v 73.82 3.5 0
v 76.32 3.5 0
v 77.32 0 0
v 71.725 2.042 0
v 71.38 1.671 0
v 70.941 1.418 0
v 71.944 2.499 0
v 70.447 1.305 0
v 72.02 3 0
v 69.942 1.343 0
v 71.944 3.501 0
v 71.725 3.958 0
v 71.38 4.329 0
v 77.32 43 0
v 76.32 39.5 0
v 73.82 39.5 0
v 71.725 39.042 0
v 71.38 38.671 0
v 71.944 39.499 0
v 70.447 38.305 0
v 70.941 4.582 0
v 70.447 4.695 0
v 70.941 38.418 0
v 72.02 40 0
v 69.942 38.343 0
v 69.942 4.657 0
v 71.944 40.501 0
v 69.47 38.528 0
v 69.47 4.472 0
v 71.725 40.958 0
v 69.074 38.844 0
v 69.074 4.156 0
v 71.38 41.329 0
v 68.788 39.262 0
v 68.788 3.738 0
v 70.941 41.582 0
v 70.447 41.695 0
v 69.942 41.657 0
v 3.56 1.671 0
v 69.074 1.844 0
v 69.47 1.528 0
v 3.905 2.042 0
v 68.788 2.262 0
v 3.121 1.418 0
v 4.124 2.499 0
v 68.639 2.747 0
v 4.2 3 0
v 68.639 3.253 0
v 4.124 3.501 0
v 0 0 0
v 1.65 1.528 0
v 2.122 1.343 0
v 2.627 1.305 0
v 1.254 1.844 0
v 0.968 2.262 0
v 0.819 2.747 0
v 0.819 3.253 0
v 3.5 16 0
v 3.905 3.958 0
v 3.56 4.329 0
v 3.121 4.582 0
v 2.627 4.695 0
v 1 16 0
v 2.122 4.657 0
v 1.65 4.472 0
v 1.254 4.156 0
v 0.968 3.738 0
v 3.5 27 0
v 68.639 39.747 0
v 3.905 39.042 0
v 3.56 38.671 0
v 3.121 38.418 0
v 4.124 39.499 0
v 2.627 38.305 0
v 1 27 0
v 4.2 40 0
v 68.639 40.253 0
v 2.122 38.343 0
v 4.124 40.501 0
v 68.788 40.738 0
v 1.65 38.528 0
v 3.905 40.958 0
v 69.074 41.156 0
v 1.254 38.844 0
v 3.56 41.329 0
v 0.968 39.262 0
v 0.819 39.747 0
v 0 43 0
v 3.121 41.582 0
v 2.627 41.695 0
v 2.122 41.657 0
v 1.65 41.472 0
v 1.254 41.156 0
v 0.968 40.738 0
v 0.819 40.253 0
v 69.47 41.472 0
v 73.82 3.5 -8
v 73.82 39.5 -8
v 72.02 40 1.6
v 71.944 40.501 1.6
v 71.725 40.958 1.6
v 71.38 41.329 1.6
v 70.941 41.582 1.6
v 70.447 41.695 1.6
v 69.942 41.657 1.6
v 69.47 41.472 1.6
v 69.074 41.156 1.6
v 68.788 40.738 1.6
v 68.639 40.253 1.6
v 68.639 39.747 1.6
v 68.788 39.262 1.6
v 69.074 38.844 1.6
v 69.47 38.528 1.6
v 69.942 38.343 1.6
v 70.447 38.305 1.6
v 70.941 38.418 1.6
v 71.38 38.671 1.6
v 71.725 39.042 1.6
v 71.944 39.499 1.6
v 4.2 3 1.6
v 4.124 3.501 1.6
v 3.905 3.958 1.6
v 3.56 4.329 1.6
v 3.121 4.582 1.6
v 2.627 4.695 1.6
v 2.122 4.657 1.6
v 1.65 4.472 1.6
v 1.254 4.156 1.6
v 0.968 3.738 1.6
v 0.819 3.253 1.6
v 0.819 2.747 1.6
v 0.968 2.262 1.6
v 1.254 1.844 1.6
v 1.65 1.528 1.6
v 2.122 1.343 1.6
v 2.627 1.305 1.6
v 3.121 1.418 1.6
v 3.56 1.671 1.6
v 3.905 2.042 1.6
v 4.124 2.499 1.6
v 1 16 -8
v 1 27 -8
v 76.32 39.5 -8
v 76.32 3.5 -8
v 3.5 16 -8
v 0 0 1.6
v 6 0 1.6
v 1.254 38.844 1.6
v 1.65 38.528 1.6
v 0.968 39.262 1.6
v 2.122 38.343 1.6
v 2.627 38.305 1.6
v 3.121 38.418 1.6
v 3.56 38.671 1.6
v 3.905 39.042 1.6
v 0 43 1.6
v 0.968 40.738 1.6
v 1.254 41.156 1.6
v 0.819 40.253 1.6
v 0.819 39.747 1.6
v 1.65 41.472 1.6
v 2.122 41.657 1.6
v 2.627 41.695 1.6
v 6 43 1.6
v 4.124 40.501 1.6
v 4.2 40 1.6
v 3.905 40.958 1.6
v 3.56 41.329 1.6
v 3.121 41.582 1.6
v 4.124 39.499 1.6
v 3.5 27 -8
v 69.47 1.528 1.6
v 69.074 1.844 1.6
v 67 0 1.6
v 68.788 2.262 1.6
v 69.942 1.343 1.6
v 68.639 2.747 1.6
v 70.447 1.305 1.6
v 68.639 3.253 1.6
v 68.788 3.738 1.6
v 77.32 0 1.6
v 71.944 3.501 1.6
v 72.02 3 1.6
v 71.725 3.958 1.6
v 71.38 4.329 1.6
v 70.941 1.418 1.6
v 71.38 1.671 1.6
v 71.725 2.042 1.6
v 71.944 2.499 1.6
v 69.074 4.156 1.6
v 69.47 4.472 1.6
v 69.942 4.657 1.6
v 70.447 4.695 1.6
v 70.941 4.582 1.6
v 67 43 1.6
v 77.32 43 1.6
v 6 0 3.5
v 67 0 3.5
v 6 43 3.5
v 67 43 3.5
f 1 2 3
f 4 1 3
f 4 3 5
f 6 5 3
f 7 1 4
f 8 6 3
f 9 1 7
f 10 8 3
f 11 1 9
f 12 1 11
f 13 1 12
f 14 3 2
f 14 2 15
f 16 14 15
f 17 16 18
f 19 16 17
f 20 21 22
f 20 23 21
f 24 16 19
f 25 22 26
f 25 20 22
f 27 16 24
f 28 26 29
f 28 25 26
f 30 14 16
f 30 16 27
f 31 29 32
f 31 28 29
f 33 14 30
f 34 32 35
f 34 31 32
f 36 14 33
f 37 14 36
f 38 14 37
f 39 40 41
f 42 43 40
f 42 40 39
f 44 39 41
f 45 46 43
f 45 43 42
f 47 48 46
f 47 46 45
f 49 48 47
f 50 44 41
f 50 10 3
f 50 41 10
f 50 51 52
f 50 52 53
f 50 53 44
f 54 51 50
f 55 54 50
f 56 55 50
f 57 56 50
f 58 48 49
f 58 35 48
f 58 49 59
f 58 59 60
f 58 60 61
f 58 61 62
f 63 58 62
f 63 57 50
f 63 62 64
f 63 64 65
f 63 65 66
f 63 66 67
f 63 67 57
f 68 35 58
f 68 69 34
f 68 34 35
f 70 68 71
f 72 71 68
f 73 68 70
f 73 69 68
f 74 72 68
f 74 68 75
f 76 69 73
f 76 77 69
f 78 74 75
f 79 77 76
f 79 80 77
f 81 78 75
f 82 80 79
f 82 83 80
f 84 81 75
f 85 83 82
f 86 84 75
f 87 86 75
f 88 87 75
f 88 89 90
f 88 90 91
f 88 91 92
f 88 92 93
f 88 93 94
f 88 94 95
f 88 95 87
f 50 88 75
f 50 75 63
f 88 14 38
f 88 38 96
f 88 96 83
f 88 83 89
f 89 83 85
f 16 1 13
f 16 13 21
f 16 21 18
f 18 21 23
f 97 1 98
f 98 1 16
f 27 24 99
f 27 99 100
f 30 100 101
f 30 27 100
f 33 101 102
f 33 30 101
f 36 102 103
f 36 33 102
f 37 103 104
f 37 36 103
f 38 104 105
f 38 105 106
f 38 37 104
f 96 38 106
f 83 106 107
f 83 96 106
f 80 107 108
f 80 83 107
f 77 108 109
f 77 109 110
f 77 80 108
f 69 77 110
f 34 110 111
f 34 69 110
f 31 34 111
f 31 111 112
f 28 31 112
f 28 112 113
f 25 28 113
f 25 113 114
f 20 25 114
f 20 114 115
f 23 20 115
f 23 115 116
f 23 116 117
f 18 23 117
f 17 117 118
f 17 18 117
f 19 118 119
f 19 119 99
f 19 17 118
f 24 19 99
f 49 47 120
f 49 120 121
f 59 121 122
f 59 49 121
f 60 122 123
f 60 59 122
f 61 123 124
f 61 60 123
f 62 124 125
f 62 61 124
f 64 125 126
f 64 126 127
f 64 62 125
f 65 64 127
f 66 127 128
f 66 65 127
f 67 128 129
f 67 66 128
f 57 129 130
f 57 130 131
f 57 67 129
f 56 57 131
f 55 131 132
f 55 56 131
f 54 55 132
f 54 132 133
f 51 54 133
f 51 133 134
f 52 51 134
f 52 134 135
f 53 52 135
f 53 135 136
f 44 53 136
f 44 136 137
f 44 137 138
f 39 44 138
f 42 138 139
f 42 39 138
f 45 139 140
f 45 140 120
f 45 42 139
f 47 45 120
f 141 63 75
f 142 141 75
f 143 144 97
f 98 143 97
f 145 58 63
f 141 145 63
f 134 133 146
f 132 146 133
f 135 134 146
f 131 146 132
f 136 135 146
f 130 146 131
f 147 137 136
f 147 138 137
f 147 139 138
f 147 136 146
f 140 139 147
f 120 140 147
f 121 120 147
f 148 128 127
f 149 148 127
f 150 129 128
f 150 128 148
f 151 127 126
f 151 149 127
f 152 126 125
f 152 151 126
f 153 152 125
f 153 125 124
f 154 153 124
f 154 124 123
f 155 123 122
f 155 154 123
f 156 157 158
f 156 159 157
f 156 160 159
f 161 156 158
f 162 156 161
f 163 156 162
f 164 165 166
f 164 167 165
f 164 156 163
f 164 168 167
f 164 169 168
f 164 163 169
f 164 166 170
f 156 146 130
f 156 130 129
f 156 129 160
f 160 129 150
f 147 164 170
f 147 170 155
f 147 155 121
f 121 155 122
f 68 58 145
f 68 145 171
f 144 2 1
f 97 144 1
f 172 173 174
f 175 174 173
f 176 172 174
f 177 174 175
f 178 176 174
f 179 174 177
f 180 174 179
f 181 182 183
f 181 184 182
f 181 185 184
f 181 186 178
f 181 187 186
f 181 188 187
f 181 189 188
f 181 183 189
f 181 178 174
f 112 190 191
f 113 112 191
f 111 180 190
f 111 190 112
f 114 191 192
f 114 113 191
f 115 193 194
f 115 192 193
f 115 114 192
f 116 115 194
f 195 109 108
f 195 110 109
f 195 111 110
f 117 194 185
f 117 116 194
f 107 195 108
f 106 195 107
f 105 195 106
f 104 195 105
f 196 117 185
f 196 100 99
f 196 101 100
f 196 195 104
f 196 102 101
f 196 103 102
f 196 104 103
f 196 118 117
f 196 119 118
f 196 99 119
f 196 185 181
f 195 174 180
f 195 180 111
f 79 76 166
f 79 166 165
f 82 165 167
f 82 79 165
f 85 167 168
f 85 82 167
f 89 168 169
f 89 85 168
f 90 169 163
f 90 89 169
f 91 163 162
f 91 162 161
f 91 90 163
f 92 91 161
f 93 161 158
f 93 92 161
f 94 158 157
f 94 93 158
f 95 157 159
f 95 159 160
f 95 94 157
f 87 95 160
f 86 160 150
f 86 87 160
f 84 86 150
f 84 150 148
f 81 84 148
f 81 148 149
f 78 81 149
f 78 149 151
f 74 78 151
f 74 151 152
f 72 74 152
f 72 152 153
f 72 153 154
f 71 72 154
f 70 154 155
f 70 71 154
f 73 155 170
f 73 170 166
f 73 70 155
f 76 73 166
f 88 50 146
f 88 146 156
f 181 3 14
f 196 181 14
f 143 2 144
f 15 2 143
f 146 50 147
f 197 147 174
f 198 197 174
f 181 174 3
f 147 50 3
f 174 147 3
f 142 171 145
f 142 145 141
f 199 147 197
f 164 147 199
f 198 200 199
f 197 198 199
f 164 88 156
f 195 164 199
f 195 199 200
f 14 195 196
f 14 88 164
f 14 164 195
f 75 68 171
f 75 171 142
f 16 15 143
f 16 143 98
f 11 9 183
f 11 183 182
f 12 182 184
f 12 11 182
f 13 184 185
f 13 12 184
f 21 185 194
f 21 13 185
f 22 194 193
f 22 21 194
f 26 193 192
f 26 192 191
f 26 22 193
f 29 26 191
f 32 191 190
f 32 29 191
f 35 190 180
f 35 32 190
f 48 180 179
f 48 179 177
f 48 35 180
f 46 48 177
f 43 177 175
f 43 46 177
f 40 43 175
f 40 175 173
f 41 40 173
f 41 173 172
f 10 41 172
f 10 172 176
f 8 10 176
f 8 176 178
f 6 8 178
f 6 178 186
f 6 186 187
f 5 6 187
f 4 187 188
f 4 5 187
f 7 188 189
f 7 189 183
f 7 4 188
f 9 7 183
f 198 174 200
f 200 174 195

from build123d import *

# Parameters (mm, degrees)
SKETCH1_W           = 77.32
SKETCH1_H           = 43
SKETCH1_R           = 1.7
BOSS_EXTRUDE1_DEPTH = 1.6
SKETCH3_W           = 61
SKETCH3_H           = 43
BOSS_EXTRUDE3_DEPTH = 3.5
SKETCH4_W           = 2.5
SKETCH4_H           = 36
SKETCH4_H_2         = 11
BOSS_EXTRUDE4_DEPTH = 8


with BuildPart() as part:
    # Sketch1 → Boss-Extrude1 (new body)
    with BuildSketch(Plane.XY):
        with Locations((38.66, 21.5)):
            Rectangle(SKETCH1_W, SKETCH1_H)
        with Locations((70.32, 40)):
            Circle(SKETCH1_R, mode=Mode.SUBTRACT)
        with Locations((70.32, 3)):
            Circle(SKETCH1_R, mode=Mode.SUBTRACT)
        with Locations((2.5, 3)):
            Circle(SKETCH1_R, mode=Mode.SUBTRACT)
        with Locations((2.5, 40)):
            Circle(SKETCH1_R, mode=Mode.SUBTRACT)
    extrude(amount=BOSS_EXTRUDE1_DEPTH)

    # Sketch3 → Boss-Extrude3 (add)
    with BuildSketch(Plane(origin=(0, 0, 0), x_dir=(-1, 0, 0), z_dir=(0, 0, -1))):
        with Locations((-36.5, 21.5)):
            Rectangle(SKETCH3_W, SKETCH3_H)
    extrude(amount=-BOSS_EXTRUDE3_DEPTH)

    # Sketch4 → Boss-Extrude4 (add)
    with BuildSketch(Plane(origin=(0, 0, 0), x_dir=(-1, 0, 0), z_dir=(0, 0, -1))):
        with Locations((-75.07, 21.5)):
            Rectangle(SKETCH4_W, SKETCH4_H)
        with Locations((-2.25, 21.5)):
            Rectangle(SKETCH4_W, SKETCH4_H_2)
    extrude(amount=BOSS_EXTRUDE4_DEPTH)


solid = part.part
